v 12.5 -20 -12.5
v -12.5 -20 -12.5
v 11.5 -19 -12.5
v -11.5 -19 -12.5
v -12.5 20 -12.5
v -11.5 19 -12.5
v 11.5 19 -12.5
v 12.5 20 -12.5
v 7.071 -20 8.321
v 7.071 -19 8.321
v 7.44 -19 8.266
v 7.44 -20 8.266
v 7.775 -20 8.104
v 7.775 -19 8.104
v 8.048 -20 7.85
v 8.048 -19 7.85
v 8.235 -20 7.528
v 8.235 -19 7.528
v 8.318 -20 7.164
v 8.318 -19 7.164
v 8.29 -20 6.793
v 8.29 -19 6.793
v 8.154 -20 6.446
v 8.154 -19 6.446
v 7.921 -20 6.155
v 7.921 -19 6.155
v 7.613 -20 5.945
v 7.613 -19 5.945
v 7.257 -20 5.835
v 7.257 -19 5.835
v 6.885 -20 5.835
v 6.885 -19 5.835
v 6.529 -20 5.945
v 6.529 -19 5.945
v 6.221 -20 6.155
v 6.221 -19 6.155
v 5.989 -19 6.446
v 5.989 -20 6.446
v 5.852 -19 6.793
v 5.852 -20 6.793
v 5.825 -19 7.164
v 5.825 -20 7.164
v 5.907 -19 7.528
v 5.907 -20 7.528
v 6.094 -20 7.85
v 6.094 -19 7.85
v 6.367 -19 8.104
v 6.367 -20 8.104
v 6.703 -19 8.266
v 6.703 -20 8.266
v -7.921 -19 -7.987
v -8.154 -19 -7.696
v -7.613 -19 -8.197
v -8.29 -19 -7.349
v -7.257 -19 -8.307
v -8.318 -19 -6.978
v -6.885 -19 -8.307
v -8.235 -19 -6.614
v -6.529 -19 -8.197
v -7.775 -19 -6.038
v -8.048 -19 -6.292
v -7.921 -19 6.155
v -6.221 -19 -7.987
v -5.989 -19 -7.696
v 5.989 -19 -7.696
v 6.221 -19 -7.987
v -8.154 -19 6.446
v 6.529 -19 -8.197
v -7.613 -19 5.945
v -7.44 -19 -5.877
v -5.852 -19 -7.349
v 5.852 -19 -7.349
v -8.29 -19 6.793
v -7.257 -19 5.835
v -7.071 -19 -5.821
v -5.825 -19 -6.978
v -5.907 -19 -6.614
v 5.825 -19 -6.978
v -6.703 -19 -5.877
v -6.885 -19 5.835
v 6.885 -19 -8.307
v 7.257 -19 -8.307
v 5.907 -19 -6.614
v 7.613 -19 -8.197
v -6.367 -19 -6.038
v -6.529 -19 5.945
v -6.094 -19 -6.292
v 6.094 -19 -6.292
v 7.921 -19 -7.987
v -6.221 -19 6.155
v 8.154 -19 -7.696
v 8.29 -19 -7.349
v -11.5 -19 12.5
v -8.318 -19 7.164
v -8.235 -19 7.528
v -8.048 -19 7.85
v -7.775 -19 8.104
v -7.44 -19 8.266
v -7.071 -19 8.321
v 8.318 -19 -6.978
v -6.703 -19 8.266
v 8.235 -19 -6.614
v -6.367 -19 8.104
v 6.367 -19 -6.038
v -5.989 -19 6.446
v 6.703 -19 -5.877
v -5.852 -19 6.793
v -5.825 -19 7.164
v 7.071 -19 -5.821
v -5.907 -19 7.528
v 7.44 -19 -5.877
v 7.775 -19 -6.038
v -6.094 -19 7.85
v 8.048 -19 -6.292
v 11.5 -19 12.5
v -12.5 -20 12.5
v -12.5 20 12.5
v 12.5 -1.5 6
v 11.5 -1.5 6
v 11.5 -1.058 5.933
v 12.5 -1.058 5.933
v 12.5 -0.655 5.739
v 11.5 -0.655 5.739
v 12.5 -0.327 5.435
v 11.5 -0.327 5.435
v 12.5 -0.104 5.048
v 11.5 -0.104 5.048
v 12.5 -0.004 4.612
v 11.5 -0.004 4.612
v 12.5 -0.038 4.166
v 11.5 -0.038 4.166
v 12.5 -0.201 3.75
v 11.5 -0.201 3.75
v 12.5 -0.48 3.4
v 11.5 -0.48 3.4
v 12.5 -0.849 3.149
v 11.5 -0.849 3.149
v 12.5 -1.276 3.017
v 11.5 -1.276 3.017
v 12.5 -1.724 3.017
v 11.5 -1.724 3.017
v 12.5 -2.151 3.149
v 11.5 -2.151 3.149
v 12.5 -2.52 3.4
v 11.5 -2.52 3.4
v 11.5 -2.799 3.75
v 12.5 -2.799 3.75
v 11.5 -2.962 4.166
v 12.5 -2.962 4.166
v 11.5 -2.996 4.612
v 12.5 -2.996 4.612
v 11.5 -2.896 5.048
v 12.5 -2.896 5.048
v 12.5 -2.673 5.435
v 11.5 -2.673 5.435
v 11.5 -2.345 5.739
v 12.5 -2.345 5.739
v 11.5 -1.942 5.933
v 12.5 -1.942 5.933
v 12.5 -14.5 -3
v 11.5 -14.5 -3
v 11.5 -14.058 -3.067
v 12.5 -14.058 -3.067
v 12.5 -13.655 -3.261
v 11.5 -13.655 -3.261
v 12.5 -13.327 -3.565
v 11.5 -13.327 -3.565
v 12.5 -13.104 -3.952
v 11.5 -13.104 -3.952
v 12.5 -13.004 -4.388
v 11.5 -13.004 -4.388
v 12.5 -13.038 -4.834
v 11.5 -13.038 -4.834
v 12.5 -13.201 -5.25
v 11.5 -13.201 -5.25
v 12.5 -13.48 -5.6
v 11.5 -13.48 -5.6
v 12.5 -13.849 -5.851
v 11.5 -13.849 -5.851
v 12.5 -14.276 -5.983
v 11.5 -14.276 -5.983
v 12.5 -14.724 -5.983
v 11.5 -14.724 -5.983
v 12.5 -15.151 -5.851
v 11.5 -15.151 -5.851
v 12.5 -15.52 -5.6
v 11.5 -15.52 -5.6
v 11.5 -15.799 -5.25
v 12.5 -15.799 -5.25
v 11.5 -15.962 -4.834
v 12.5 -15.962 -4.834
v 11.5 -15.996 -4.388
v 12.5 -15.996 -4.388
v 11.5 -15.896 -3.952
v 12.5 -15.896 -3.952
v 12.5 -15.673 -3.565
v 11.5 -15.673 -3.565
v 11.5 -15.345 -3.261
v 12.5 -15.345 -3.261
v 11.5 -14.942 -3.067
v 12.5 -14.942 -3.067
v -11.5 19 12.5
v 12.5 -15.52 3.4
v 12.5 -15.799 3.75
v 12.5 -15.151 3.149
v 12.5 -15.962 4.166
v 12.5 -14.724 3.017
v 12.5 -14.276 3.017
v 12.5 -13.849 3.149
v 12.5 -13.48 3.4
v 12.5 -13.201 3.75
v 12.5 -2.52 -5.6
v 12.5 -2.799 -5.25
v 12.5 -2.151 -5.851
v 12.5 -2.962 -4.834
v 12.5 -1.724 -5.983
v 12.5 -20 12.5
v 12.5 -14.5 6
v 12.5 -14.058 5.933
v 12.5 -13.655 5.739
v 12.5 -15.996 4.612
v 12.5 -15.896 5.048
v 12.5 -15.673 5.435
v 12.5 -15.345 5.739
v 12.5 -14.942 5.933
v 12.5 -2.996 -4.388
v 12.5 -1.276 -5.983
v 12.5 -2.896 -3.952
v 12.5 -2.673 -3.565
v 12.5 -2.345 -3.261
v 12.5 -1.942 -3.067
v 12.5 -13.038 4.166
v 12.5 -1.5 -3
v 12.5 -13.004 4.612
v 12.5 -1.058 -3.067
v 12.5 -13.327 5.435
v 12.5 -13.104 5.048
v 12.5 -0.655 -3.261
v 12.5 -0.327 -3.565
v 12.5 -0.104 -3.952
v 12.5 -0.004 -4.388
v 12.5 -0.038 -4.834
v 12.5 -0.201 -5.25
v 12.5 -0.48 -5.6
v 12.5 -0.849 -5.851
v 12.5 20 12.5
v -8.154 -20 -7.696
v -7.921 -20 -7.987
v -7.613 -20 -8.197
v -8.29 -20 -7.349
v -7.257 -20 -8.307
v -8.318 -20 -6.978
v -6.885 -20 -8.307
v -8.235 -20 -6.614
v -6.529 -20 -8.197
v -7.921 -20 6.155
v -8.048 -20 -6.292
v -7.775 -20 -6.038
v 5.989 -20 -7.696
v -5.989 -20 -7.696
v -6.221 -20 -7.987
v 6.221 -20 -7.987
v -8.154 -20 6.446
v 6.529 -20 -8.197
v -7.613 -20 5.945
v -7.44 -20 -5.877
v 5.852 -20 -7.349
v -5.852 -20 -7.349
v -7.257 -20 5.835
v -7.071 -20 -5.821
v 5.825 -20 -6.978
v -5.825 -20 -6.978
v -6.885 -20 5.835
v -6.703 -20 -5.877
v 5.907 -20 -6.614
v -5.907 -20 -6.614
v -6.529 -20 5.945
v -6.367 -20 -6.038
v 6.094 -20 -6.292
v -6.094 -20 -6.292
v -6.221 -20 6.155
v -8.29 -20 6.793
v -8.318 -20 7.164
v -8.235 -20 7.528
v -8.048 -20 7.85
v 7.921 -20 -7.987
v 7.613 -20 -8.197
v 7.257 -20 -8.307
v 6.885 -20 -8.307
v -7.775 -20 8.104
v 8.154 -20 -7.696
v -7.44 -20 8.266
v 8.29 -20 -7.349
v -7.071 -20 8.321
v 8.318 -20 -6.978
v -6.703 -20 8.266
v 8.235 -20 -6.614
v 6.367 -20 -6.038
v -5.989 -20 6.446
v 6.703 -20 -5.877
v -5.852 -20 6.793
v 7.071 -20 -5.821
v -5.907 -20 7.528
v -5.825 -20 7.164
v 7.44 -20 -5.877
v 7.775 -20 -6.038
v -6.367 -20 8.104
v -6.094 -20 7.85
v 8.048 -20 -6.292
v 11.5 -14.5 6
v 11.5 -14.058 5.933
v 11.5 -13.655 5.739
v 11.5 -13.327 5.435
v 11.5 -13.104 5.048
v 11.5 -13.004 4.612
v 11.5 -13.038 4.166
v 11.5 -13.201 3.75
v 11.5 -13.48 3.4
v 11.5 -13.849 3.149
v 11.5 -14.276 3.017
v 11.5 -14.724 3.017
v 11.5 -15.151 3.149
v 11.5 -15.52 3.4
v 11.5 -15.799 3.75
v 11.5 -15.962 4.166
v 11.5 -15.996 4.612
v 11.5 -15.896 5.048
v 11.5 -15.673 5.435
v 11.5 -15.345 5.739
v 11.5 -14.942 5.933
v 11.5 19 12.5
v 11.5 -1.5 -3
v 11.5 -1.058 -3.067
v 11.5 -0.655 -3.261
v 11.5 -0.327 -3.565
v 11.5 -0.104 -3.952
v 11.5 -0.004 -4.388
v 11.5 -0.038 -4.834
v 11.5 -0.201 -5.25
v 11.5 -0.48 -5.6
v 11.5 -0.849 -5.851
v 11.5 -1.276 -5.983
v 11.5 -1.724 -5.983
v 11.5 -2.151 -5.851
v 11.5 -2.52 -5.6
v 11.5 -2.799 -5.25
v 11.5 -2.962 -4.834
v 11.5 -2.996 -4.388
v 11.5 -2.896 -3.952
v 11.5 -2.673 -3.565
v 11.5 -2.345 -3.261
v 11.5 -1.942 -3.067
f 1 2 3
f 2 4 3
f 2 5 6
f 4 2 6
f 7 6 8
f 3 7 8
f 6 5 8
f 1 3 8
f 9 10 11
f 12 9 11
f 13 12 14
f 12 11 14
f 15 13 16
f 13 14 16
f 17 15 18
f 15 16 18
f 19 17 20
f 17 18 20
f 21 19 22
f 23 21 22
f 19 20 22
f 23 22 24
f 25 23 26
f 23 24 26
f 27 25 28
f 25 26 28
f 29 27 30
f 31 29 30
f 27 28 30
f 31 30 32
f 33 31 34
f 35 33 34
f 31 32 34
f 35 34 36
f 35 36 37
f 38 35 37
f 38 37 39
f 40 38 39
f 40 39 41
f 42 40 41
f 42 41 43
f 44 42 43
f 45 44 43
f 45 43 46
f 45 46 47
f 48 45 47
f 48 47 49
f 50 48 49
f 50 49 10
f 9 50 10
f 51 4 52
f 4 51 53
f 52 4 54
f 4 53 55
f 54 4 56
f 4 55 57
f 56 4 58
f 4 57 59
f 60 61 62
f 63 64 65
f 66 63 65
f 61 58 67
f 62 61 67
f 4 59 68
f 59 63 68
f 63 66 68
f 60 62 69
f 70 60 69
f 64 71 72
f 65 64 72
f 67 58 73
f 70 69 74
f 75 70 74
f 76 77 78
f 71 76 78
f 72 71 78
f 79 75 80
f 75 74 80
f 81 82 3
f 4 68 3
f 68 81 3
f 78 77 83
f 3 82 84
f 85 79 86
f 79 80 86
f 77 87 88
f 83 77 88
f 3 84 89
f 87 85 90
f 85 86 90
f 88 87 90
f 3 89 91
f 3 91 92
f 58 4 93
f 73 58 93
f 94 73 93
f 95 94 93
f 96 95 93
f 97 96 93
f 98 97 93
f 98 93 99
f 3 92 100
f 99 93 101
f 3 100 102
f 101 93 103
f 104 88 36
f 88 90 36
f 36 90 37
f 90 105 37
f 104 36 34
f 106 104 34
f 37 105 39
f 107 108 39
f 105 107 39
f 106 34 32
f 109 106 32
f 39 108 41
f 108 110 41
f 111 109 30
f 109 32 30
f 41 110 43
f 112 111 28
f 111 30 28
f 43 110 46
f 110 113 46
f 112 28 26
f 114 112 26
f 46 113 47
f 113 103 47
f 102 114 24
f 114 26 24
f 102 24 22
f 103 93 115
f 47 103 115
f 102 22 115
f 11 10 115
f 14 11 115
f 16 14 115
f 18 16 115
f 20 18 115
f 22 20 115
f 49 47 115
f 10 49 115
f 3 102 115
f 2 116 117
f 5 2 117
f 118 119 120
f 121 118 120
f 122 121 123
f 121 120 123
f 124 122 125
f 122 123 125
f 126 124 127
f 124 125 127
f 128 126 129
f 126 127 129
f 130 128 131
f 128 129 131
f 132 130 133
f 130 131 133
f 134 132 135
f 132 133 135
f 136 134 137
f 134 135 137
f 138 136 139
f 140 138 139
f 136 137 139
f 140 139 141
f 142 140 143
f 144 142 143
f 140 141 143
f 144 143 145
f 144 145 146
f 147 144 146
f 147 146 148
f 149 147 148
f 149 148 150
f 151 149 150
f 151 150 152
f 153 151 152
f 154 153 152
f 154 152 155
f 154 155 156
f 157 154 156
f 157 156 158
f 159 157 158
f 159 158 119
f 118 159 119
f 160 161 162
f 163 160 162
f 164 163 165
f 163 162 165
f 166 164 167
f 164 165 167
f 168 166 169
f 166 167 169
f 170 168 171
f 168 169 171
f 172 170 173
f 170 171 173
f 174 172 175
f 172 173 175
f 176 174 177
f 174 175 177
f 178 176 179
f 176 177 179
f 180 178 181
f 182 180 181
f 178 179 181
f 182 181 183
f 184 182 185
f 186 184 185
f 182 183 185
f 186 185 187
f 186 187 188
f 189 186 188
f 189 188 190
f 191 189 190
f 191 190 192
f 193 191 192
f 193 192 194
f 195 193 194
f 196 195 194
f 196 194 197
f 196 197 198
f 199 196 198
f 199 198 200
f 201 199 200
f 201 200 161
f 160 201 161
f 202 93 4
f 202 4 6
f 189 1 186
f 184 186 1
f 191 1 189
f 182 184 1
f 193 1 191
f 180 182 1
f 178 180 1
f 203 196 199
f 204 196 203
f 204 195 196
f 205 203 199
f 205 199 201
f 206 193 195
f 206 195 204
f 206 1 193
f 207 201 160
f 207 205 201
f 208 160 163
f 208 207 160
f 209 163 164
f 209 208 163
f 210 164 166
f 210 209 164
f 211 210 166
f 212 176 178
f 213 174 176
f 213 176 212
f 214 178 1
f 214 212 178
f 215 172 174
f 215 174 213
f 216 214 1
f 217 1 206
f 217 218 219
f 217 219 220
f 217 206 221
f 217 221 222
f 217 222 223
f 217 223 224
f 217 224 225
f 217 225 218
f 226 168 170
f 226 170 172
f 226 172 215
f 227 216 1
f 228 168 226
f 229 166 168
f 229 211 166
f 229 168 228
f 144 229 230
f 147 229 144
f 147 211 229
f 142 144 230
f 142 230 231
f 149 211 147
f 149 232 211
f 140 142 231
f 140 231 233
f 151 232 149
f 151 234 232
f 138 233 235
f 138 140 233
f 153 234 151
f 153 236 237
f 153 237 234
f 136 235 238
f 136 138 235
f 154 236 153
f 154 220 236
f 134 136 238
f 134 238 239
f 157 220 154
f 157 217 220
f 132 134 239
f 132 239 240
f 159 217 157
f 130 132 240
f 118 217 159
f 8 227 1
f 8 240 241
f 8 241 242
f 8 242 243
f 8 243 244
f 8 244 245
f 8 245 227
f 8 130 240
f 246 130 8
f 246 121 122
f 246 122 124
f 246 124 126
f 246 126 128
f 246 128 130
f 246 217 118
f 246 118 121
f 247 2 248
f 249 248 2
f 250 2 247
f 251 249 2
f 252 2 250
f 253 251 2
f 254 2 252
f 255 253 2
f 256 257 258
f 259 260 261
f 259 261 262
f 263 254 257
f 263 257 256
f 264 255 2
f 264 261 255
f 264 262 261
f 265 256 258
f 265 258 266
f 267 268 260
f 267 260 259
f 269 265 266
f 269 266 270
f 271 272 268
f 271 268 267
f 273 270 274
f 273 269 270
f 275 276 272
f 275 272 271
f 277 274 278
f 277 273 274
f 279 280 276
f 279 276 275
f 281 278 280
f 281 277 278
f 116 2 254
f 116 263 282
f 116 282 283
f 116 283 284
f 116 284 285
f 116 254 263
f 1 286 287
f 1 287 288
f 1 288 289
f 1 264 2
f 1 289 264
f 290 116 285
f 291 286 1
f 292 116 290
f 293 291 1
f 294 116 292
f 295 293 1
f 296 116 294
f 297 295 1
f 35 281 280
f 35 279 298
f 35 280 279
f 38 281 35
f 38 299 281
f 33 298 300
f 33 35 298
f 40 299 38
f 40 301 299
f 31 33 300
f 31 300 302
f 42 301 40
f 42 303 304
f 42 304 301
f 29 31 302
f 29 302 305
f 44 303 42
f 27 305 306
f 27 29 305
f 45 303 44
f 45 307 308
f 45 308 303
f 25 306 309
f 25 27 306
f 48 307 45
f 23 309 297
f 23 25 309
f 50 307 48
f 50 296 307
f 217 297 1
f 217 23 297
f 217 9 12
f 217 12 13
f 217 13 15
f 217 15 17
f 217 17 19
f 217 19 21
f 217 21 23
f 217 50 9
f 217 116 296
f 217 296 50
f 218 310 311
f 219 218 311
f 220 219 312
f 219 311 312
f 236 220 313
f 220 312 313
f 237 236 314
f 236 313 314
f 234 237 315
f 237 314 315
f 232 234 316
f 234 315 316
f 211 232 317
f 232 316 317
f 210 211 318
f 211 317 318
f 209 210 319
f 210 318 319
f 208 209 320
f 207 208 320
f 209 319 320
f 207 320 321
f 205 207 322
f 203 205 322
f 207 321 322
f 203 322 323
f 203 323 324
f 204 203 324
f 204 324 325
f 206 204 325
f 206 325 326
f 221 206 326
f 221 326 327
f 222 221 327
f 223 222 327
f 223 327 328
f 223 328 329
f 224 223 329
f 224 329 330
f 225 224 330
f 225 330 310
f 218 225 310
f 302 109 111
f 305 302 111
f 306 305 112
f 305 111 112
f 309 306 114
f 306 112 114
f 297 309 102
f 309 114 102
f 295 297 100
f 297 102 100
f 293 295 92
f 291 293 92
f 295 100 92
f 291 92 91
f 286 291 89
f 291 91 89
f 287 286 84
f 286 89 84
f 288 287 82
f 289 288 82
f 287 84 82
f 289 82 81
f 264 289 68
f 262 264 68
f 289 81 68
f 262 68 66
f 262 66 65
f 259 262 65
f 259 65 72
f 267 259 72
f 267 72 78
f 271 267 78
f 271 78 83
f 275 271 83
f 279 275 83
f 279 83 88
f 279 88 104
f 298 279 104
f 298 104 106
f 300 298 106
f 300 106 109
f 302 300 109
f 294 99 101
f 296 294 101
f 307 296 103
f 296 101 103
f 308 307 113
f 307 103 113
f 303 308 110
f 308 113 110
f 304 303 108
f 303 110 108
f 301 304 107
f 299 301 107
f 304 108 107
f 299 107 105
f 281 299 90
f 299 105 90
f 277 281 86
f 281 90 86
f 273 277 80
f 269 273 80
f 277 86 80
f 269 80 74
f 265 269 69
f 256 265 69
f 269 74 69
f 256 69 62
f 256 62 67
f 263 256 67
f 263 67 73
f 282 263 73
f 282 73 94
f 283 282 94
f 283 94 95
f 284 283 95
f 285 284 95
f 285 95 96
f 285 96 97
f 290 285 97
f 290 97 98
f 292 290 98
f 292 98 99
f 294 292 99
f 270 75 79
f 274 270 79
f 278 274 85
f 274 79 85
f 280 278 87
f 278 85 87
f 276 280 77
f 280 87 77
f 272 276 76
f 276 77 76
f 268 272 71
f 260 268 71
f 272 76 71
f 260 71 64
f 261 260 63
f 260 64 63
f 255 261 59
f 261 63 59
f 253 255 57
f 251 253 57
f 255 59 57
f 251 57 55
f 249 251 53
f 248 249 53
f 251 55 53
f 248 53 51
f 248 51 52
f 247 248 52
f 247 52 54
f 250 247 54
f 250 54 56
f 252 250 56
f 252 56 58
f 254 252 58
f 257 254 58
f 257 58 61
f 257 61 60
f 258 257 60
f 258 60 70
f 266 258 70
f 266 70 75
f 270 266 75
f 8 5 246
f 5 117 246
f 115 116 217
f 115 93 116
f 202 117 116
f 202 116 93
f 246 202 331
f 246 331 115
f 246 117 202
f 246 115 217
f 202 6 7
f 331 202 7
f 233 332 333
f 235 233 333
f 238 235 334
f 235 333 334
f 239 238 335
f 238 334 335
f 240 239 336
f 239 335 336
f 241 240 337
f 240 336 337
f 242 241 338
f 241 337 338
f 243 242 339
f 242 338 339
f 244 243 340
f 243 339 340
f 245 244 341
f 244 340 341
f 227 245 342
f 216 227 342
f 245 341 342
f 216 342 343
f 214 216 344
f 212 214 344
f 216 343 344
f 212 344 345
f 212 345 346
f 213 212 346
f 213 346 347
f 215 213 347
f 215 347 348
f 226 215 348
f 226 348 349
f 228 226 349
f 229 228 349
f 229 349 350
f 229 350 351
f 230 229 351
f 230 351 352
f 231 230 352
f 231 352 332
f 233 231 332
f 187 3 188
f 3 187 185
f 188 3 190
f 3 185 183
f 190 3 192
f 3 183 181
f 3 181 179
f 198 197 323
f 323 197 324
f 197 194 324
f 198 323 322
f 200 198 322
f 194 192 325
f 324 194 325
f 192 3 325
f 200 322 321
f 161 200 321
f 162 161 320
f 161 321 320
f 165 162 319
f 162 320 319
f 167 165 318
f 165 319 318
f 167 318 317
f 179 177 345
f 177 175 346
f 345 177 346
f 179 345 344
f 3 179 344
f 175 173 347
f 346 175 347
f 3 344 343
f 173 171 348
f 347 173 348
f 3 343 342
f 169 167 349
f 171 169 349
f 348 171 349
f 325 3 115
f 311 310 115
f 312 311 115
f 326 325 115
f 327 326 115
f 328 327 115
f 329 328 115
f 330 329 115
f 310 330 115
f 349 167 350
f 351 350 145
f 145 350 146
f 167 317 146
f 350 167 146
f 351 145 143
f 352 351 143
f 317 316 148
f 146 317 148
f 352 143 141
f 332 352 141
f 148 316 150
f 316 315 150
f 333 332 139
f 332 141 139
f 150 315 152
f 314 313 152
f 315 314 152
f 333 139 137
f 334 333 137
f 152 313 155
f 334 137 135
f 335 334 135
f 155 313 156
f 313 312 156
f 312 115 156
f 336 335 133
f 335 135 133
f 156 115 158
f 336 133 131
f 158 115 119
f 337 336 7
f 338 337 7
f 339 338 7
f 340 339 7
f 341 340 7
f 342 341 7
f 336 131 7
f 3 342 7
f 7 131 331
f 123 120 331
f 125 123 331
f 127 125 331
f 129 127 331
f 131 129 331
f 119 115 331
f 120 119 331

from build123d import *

# Parameters (mm, degrees)
SKETCH_1_W          = 25
SKETCH_1_H          = 40
SKETCH_1_W_2        = 23
SKETCH_1_H_2        = 38
EXTRUDE_1_DEPTH     = 12.5
SKETCH_2_R          = 1.25
CUT_EXTRUDE_1_DEPTH = 10
SKETCH_3_R          = 1.5
CUT_EXTRUDE_2_DEPTH = 10


with BuildPart() as part:
    # 草图1 → 凸台-拉伸1 (new, symmetric)
    with BuildSketch(Plane.XY):
        Rectangle(SKETCH_1_W, SKETCH_1_H)
        Rectangle(SKETCH_1_W_2, SKETCH_1_H_2, mode=Mode.SUBTRACT)
    extrude(amount=EXTRUDE_1_DEPTH, both=True)

    # 草图2 → 切除-拉伸1 (cut)
    with BuildSketch(Plane(origin=(0, -19, 0), x_dir=(1, 0, 0), z_dir=(0, 1, 0))):
        with Locations(Location((7.071067812, -7.071067812, 0), (0, 0, 270))):
            Circle(SKETCH_2_R)
        with Locations(Location((7.071067812, 7.071067812, 0), (0, 0, 270))):
            Circle(SKETCH_2_R)
        with Locations(Location((-7.071067812, 7.071067812, 0), (0, 0, 270))):
            Circle(SKETCH_2_R)
        with Locations(Location((-7.071067812, -7.071067812, 0), (0, 0, 270))):
            Circle(SKETCH_2_R)
    extrude(amount=-CUT_EXTRUDE_1_DEPTH, mode=Mode.SUBTRACT)

    # 草图3 → 切除-拉伸2 (cut)
    with BuildSketch(Plane.ZY.offset(-11.5)):
        with Locations((4.5, -14.5)):
            Circle(SKETCH_3_R)
        with Locations((-4.5, -14.5)):
            Circle(SKETCH_3_R)
        with Locations((-4.5, -1.5)):
            Circle(SKETCH_3_R)
        with Locations((4.5, -1.5)):
            Circle(SKETCH_3_R)
    extrude(amount=-CUT_EXTRUDE_2_DEPTH, mode=Mode.SUBTRACT)


solid = part.part
